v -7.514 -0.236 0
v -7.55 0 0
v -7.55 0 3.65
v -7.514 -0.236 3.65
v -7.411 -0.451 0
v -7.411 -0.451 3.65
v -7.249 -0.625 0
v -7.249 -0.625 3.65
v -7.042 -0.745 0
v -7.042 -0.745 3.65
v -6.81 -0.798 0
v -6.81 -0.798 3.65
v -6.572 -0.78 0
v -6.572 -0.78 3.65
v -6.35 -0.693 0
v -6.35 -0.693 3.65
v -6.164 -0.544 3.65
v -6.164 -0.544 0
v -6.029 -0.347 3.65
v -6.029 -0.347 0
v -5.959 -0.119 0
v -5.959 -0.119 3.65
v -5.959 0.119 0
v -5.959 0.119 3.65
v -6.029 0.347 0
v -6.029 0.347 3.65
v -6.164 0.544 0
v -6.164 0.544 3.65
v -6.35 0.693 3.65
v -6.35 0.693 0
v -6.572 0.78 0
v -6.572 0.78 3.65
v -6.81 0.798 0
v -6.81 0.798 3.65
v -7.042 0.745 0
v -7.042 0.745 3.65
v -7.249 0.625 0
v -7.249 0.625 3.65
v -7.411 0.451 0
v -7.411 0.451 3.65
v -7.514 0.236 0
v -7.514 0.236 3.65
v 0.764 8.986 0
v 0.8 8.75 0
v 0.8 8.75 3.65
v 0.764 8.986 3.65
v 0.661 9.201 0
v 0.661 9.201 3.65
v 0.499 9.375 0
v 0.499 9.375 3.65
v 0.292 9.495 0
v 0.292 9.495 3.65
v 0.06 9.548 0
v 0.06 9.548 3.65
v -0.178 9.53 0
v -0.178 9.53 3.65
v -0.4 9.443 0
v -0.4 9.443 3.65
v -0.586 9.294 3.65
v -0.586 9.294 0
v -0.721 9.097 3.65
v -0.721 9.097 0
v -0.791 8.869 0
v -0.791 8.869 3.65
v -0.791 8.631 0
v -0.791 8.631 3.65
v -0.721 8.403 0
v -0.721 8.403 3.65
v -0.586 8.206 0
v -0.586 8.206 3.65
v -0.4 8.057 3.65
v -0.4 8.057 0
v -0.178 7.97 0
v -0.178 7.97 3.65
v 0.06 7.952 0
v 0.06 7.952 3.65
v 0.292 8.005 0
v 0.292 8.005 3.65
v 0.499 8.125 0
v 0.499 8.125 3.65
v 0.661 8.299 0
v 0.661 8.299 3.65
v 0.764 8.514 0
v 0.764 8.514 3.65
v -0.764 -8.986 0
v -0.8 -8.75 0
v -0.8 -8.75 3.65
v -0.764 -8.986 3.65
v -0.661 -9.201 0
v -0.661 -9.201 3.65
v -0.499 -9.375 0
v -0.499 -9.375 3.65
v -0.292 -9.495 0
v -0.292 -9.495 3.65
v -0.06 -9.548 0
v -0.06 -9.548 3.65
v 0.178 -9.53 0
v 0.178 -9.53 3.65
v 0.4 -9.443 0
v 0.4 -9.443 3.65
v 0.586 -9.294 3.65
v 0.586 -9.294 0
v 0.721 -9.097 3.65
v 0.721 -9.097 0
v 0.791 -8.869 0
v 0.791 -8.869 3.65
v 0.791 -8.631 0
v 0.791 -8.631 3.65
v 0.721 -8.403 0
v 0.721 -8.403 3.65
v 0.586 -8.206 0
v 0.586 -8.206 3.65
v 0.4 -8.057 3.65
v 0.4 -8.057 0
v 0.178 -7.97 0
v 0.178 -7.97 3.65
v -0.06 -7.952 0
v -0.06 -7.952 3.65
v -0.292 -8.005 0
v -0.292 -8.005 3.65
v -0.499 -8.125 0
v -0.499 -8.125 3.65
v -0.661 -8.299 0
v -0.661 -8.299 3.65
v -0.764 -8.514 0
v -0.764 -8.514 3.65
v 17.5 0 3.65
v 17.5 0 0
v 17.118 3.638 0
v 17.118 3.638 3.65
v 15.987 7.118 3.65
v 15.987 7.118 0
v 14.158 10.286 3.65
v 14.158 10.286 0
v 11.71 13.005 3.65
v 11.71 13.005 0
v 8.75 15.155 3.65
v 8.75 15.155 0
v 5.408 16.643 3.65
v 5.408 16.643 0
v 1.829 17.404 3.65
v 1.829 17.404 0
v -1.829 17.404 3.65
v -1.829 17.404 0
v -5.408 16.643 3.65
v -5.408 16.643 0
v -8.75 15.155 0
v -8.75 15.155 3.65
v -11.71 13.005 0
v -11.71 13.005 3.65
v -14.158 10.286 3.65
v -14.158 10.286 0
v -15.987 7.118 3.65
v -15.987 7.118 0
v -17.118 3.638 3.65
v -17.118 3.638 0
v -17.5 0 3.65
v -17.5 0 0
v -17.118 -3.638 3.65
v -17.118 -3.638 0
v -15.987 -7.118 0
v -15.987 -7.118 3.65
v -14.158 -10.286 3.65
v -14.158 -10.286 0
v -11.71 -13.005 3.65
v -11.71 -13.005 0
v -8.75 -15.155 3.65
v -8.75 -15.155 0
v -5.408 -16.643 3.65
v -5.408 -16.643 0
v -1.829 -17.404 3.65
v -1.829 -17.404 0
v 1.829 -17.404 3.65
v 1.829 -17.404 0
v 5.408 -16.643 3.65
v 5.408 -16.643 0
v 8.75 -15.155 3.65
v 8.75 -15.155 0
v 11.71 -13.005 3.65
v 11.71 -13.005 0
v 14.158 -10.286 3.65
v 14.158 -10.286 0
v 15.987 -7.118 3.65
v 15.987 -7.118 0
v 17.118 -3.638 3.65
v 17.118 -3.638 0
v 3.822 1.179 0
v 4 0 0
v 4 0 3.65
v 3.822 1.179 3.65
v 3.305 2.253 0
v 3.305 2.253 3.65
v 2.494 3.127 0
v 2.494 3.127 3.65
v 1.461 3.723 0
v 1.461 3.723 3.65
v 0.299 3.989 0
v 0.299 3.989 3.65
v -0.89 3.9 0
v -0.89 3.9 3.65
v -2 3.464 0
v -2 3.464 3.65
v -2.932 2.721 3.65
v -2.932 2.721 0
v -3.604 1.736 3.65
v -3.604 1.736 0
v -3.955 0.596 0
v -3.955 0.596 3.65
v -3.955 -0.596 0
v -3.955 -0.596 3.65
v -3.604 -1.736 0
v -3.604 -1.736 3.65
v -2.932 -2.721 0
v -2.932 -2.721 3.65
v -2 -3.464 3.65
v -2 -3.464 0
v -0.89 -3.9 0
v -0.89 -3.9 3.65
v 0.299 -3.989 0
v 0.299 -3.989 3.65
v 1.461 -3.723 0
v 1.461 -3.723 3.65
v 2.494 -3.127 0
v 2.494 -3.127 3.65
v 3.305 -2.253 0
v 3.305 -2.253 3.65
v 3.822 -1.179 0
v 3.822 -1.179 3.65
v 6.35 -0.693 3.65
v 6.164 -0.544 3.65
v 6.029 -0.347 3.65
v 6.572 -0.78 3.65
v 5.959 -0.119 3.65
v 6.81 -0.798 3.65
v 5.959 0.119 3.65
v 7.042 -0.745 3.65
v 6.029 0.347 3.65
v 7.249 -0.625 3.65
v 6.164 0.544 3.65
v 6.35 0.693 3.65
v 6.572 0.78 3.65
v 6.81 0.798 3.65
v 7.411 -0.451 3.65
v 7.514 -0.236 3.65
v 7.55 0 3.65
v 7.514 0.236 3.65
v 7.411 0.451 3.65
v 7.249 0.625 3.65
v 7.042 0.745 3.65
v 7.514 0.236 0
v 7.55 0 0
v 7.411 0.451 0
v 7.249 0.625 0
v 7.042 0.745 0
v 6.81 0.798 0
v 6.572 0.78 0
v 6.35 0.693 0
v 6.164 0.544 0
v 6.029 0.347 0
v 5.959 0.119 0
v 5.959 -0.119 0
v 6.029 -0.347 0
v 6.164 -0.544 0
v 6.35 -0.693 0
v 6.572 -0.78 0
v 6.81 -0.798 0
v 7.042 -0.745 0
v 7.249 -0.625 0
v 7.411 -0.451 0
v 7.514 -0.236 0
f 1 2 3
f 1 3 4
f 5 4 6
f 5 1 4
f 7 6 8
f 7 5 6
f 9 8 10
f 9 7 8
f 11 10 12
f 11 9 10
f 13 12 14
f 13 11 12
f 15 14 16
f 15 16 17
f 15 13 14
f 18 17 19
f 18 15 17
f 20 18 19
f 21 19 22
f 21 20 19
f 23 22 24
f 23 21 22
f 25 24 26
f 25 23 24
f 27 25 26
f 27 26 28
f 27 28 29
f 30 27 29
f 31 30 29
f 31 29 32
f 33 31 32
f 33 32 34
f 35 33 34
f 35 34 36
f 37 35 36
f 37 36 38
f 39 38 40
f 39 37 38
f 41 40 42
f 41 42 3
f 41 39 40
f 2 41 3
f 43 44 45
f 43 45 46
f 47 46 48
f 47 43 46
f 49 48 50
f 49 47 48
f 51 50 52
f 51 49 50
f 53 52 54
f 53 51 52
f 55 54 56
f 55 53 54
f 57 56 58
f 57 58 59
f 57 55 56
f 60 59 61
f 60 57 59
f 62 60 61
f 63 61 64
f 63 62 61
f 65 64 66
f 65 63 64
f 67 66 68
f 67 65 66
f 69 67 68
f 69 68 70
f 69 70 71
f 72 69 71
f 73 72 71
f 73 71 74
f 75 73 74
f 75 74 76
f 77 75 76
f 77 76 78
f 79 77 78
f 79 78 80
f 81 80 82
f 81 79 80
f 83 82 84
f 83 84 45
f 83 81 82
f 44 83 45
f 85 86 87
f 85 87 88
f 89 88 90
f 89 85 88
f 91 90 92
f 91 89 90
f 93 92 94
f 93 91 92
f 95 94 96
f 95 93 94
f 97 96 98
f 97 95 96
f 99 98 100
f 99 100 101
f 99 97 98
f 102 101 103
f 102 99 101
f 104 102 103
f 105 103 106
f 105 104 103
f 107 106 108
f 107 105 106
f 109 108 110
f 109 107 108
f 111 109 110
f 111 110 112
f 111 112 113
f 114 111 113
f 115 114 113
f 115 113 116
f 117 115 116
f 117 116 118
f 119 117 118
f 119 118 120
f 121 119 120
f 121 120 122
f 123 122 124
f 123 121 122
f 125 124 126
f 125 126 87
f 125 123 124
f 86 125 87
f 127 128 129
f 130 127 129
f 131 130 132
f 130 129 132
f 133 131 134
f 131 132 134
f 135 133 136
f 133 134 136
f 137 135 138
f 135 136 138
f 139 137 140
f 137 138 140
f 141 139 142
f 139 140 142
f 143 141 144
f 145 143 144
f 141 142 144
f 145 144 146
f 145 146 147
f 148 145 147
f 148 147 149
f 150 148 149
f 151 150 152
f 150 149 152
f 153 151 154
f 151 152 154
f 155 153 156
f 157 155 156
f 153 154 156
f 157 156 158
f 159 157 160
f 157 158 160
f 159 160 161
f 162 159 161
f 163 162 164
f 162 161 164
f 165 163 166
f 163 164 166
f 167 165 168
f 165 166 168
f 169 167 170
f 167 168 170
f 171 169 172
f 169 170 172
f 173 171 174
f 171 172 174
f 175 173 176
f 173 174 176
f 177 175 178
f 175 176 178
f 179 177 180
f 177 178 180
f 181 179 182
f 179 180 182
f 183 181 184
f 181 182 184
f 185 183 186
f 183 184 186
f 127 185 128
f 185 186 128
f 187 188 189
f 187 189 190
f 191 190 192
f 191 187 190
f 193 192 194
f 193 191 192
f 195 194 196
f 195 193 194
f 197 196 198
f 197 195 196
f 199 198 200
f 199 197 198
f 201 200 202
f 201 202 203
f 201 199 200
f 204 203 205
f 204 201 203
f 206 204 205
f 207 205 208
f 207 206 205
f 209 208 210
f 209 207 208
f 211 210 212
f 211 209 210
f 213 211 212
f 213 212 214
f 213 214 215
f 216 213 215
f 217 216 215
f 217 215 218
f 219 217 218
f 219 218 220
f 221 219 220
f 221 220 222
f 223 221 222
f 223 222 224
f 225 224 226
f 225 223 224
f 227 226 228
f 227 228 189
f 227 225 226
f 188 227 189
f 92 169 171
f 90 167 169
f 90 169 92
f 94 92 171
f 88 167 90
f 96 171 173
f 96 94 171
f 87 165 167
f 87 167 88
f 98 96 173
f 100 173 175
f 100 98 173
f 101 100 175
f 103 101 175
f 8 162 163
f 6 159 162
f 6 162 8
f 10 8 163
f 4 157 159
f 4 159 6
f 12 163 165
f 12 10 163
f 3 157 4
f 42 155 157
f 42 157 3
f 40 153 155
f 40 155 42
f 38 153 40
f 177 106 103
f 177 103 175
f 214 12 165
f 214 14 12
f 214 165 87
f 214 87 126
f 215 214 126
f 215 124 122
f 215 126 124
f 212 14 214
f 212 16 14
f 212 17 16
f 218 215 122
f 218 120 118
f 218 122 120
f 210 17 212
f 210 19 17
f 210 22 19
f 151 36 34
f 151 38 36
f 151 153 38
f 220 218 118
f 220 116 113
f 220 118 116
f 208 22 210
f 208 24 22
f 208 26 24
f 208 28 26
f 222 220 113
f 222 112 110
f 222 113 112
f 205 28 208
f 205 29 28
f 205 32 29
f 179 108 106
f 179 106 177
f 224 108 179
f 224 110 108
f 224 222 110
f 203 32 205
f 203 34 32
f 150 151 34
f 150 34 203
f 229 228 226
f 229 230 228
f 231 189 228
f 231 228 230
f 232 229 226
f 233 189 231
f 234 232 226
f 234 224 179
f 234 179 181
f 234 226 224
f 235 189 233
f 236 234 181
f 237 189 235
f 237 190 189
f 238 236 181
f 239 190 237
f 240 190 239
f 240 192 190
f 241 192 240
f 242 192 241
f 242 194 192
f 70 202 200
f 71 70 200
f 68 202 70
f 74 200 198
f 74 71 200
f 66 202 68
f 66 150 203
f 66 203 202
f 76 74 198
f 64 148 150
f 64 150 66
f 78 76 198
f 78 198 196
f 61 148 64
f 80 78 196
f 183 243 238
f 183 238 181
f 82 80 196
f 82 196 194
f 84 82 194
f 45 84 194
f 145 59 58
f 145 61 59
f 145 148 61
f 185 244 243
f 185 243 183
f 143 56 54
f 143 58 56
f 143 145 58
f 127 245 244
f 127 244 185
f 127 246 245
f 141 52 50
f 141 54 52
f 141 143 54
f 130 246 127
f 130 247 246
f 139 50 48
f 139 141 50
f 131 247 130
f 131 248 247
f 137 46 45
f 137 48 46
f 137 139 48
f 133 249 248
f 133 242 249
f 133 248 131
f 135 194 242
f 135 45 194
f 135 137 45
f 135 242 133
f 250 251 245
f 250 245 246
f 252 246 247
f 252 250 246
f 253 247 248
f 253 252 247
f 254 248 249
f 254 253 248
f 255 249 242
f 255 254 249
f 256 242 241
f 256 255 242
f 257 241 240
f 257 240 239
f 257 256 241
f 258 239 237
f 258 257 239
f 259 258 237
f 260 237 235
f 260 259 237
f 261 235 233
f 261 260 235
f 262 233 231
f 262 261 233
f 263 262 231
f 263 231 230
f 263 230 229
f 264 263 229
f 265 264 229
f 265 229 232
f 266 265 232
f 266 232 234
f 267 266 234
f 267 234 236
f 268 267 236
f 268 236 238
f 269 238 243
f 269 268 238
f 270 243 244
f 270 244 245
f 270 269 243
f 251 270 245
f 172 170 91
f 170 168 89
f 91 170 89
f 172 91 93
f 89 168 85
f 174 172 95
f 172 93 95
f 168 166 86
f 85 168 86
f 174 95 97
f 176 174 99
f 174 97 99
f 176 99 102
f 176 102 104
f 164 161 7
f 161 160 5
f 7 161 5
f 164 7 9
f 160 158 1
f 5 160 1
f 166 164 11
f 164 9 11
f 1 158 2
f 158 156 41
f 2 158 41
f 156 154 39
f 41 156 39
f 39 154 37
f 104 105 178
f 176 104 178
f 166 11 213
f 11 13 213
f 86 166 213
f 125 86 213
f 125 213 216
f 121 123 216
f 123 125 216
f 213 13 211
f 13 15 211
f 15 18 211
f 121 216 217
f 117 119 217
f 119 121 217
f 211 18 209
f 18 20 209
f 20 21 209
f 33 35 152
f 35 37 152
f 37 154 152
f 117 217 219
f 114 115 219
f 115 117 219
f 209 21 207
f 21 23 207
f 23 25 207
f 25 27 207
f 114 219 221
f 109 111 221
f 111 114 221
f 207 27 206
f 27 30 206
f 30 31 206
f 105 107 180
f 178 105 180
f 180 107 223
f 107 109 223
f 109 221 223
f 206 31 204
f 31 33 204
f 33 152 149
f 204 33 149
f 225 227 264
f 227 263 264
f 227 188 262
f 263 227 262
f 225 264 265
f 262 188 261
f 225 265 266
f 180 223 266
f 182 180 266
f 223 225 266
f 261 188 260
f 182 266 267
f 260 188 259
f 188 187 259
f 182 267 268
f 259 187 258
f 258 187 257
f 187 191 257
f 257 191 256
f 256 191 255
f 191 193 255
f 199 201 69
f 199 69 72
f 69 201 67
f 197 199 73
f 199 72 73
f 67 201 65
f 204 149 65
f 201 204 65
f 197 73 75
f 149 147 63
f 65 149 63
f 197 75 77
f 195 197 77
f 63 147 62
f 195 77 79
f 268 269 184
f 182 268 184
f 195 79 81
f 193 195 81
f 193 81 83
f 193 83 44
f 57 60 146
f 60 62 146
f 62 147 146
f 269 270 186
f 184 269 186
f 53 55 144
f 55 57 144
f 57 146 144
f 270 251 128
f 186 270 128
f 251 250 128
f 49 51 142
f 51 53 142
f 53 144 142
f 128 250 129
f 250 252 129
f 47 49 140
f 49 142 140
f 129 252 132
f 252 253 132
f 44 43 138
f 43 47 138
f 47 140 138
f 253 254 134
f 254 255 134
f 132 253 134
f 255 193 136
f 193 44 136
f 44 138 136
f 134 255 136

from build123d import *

# Parameters (mm, degrees)
SKETCH1_R           = 17.5
SKETCH1_R_2         = 4
SKETCH1_R_3         = 0.8
BOSS_EXTRUDE1_DEPTH = 3.65


with BuildPart() as part:
    # Sketch1 → Boss-Extrude1 (new body)
    with BuildSketch(Plane.XY):
        Circle(SKETCH1_R)
        Circle(SKETCH1_R_2, mode=Mode.SUBTRACT)
        with Locations((6.75, 0)):
            Circle(SKETCH1_R_3, mode=Mode.SUBTRACT)
        with Locations((0, 8.75)):
            Circle(SKETCH1_R_3, mode=Mode.SUBTRACT)
        with Locations(Location((0, -8.75, 0), (0, 0, 180))):
            Circle(SKETCH1_R_3, mode=Mode.SUBTRACT)
        with Locations(Location((-6.75, 0, 0), (0, 0, 180))):
            Circle(SKETCH1_R_3, mode=Mode.SUBTRACT)
    extrude(amount=BOSS_EXTRUDE1_DEPTH)


solid = part.part
